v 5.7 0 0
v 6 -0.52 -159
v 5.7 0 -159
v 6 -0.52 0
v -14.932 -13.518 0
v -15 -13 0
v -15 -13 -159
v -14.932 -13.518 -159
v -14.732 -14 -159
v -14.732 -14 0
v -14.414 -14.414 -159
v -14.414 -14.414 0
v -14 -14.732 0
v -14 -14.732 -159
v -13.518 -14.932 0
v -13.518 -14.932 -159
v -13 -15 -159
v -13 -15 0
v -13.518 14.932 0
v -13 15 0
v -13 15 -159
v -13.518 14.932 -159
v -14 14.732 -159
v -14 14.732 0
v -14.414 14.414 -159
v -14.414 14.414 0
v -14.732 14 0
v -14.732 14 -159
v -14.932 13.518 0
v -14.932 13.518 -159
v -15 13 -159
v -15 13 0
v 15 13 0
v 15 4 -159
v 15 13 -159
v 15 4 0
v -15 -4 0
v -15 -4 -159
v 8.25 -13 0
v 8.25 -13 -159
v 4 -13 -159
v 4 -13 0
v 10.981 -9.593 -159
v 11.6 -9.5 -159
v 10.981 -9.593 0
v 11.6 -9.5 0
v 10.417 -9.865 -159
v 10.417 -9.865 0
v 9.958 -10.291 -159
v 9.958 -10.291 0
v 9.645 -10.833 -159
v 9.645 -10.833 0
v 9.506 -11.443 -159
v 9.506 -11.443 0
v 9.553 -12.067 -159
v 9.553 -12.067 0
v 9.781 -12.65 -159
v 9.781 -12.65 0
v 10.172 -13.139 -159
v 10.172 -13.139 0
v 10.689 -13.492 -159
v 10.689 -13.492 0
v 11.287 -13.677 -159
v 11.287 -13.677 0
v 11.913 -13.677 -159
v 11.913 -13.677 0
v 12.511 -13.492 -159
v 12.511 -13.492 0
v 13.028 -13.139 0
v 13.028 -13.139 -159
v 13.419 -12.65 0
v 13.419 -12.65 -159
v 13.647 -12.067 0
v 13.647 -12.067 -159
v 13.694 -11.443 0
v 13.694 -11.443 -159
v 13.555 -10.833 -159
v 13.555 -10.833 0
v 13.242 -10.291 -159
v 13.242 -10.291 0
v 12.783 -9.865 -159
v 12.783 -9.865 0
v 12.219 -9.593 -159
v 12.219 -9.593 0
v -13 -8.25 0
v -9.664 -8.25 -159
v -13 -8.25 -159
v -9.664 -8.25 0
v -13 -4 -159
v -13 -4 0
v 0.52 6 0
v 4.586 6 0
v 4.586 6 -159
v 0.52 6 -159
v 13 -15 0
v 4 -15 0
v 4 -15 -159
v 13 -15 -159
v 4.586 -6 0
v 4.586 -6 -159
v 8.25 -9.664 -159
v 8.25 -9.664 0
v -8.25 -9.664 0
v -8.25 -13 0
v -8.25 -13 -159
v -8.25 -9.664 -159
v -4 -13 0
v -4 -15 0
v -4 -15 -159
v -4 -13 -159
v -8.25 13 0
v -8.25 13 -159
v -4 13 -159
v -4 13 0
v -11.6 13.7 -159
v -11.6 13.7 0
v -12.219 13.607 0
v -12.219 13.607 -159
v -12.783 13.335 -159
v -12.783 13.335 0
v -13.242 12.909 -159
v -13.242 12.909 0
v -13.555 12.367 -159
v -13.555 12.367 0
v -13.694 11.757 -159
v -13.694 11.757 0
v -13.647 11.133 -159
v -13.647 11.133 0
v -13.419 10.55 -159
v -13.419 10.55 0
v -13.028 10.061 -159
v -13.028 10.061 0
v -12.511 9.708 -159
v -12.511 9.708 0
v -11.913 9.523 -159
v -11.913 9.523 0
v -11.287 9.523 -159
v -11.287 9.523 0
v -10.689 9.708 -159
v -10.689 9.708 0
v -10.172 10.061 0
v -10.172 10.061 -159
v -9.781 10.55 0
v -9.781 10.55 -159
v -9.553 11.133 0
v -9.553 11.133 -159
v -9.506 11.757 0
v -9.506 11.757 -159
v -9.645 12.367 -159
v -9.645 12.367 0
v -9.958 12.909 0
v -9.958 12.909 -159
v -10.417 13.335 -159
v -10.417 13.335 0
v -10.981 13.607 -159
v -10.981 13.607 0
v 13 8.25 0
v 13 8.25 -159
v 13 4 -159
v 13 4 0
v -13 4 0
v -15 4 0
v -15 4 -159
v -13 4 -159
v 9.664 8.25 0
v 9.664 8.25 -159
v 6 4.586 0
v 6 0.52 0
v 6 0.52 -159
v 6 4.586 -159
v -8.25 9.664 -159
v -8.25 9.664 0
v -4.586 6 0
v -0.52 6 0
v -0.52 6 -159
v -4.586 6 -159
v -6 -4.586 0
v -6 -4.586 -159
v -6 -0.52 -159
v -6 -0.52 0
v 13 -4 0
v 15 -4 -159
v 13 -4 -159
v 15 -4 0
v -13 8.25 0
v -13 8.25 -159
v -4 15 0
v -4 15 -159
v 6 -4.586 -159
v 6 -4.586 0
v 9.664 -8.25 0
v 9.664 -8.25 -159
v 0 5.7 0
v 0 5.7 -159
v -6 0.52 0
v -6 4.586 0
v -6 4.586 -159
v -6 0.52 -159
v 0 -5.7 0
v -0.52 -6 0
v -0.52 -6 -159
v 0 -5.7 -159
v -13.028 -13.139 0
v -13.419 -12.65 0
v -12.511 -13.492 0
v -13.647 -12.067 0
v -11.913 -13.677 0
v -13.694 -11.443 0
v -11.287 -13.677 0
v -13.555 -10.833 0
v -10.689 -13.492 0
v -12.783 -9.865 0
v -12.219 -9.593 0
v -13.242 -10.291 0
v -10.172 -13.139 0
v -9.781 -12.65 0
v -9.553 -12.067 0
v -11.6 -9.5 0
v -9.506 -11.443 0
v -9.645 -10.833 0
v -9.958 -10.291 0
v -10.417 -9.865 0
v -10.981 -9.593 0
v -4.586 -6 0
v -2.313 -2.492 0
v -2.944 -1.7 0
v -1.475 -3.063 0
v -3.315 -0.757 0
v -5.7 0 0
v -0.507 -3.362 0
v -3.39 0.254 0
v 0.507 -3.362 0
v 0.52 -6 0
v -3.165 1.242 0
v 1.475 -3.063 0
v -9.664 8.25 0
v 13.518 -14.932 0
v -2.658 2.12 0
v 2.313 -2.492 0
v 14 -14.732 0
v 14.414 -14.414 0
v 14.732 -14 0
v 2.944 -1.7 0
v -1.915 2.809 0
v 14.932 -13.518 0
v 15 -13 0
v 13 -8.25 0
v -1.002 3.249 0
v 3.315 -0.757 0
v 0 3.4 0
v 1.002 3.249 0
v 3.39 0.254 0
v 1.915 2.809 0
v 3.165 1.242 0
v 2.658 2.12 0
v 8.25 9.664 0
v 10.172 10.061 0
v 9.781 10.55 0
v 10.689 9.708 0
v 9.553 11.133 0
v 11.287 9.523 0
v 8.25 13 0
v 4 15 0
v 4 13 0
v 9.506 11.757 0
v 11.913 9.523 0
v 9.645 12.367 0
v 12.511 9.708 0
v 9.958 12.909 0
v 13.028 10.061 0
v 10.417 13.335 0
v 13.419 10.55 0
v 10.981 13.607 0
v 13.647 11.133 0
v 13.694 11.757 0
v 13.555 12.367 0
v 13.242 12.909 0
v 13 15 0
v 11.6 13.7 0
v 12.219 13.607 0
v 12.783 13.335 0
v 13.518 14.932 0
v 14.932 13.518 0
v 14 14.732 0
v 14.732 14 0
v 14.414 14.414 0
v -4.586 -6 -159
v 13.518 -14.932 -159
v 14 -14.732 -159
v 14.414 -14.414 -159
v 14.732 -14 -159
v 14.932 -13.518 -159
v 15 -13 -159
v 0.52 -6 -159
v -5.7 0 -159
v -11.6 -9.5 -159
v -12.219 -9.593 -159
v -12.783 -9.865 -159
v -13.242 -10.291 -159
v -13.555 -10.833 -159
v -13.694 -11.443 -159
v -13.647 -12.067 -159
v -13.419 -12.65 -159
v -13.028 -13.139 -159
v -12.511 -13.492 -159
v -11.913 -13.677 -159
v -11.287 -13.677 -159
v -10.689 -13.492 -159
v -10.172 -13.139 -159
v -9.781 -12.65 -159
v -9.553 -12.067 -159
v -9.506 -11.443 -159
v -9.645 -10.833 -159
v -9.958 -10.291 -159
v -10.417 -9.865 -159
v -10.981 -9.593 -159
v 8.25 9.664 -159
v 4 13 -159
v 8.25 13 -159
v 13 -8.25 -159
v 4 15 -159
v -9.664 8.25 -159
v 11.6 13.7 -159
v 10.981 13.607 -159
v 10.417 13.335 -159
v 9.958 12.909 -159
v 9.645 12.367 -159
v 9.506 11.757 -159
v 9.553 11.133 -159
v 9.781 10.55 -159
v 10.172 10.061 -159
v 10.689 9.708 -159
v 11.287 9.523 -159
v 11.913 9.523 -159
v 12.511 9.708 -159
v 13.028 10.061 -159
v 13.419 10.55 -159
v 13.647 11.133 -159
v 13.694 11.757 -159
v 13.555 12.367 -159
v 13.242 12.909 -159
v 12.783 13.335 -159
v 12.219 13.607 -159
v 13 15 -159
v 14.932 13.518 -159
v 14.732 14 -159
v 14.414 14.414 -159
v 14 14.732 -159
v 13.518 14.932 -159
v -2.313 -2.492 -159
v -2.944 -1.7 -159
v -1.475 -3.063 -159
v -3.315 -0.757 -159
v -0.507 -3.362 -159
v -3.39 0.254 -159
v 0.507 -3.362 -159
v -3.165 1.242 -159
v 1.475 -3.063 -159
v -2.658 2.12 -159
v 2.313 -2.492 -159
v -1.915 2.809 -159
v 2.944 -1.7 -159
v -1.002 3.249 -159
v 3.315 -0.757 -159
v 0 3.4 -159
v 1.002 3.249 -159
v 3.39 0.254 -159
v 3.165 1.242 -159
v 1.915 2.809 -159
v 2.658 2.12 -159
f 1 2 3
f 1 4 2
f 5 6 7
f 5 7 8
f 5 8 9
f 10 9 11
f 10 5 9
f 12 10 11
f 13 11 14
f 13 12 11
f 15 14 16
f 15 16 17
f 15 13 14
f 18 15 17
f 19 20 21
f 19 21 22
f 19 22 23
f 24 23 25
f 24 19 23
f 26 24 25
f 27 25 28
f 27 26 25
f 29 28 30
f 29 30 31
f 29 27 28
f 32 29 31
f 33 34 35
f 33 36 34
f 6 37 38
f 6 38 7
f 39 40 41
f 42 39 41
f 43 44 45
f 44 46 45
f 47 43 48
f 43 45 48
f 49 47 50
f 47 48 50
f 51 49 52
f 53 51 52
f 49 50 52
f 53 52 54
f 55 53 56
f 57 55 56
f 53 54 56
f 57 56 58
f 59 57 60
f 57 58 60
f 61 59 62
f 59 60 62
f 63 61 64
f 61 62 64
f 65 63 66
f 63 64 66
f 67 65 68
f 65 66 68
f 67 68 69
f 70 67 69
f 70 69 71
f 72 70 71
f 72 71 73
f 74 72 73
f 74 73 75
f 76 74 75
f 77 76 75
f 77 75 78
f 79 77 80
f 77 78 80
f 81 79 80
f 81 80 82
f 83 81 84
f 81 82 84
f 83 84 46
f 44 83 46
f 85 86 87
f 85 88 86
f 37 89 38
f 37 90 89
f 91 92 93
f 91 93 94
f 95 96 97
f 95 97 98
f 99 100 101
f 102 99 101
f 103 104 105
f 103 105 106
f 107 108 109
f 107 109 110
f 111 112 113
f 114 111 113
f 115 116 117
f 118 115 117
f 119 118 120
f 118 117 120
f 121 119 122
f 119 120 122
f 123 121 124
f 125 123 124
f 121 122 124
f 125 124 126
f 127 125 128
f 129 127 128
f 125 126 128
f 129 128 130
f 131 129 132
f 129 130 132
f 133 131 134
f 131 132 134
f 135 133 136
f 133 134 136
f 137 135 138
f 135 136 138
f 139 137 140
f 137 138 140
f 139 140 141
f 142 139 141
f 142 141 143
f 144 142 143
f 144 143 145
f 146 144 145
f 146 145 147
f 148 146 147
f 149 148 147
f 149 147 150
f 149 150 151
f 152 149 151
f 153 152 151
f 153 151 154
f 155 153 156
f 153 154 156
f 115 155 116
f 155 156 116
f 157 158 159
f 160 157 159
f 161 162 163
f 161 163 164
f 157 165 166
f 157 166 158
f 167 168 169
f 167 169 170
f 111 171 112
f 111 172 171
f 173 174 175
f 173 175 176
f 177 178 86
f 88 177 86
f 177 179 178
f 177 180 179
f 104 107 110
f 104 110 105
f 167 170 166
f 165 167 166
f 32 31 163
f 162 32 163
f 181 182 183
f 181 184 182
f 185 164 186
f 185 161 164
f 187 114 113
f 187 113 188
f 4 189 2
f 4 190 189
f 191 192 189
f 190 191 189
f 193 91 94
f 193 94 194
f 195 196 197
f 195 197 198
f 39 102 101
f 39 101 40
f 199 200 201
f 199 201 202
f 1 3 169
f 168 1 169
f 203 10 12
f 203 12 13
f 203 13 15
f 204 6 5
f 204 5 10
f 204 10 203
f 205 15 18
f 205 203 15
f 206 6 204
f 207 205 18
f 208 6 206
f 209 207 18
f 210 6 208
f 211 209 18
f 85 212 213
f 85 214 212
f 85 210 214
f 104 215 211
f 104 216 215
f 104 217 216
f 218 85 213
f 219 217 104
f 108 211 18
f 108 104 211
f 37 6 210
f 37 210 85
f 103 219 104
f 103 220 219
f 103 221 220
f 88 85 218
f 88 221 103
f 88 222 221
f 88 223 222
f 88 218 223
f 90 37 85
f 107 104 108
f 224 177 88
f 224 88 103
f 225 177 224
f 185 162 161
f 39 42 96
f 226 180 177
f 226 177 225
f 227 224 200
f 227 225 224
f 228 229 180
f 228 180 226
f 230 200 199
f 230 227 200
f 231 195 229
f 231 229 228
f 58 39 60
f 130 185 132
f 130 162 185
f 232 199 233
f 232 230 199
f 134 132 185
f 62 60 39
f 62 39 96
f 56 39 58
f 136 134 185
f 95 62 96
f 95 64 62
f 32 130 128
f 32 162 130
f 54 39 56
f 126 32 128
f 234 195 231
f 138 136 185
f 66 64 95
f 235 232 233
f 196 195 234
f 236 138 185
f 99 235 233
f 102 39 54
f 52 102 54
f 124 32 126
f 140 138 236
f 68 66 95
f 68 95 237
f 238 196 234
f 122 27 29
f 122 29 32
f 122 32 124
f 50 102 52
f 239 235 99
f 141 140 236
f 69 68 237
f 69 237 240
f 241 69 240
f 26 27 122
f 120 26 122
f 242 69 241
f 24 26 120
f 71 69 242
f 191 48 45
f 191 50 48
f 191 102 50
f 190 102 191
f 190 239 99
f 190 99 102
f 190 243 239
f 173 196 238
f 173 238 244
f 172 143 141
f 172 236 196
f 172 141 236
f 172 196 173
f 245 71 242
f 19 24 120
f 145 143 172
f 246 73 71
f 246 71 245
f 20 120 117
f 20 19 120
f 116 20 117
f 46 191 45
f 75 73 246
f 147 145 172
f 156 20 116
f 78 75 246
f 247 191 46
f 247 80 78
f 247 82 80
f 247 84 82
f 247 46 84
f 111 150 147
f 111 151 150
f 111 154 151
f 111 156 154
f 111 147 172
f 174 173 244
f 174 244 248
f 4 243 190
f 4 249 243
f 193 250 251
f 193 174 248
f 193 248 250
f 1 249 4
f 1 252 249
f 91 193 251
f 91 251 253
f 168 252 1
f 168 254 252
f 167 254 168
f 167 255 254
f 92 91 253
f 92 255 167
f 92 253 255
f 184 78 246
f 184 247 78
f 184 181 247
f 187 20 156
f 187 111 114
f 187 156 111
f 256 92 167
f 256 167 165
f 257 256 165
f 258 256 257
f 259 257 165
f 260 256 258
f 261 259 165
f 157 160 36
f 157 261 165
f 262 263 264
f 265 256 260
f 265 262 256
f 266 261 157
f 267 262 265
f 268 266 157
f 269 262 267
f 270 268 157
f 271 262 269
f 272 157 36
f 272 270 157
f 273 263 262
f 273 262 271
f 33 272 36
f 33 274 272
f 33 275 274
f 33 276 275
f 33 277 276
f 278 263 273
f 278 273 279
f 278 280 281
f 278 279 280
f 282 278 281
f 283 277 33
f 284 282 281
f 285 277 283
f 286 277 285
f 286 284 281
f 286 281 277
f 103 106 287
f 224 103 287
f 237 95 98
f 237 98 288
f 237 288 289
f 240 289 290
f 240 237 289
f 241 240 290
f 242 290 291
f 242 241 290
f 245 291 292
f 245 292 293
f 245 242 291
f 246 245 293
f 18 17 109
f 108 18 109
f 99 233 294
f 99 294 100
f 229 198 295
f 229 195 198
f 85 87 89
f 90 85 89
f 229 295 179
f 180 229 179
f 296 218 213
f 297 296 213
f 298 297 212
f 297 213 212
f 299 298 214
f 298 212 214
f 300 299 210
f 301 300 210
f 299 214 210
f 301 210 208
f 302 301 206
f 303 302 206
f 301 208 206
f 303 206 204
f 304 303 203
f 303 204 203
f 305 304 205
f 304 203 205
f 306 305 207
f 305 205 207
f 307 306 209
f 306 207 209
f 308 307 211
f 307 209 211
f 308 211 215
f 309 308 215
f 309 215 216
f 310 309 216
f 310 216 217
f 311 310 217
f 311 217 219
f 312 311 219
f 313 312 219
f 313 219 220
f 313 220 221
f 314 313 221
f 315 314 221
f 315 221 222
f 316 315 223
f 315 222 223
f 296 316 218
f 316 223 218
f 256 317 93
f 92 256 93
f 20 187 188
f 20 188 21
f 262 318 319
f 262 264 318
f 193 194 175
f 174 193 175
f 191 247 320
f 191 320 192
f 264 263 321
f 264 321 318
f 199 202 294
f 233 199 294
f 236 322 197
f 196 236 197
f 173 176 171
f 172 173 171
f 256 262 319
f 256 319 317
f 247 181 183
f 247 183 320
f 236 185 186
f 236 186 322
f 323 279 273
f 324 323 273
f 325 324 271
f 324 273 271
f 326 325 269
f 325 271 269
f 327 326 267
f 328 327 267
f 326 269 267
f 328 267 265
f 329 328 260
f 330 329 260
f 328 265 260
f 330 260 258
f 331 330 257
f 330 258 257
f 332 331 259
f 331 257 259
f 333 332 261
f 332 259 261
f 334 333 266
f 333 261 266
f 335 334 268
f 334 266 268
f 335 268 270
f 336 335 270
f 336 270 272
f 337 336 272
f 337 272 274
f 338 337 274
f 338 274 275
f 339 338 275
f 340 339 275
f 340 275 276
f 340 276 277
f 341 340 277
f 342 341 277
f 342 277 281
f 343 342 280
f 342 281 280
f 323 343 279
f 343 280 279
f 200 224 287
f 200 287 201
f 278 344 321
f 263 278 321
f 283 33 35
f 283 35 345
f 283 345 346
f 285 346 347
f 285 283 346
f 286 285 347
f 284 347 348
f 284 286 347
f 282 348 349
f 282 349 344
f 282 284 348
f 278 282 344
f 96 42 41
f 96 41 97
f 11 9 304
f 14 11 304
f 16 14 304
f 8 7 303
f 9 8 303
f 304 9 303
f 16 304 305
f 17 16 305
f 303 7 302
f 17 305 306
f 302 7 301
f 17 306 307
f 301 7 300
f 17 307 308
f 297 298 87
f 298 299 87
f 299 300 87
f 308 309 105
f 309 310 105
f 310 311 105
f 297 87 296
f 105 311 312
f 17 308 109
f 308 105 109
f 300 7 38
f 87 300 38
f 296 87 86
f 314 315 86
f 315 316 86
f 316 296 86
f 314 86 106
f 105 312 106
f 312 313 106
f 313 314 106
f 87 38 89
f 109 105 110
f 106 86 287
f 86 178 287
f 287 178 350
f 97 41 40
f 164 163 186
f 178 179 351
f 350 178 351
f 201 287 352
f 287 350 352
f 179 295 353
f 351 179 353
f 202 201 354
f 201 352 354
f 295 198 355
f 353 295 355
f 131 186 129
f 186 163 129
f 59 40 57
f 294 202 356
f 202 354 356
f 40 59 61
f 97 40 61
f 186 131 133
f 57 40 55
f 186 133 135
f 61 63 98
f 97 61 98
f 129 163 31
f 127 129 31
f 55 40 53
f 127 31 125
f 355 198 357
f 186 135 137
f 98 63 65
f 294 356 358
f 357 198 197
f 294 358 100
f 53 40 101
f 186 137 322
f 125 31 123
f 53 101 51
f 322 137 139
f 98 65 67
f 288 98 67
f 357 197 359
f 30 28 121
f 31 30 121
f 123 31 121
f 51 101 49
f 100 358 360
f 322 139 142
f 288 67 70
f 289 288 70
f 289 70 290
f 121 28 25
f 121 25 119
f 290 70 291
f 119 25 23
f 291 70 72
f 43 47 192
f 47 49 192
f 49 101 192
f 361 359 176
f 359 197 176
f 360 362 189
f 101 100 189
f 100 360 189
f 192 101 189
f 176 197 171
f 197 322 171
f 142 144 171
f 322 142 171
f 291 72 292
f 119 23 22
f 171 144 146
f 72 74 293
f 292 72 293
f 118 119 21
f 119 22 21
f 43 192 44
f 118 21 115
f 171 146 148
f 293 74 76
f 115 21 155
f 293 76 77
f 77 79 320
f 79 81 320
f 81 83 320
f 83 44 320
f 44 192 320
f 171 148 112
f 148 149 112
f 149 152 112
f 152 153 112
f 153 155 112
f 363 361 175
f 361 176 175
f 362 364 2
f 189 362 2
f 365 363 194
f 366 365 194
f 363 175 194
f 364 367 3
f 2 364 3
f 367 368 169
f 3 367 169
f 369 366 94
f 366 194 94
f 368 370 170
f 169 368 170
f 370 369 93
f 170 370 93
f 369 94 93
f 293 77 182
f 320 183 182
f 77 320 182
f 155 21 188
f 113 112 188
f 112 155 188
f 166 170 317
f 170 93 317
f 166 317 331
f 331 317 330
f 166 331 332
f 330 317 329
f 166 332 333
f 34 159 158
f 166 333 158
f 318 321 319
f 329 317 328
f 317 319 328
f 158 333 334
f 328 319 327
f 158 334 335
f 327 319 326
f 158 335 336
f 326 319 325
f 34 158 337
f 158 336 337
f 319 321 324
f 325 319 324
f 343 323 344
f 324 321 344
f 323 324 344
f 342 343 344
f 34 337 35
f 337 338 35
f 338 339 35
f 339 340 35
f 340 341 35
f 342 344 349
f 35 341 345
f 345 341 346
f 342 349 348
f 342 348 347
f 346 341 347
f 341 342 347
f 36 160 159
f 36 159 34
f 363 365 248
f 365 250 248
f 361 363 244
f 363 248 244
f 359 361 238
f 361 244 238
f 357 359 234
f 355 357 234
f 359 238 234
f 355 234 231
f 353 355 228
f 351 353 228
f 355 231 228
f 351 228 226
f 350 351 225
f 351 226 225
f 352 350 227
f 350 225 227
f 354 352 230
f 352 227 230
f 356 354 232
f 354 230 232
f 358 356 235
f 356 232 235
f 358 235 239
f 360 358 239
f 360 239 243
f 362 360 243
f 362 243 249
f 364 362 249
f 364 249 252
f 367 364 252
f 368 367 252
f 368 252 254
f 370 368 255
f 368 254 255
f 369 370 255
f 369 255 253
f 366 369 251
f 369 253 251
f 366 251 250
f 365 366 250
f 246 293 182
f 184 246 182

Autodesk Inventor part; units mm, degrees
sketch "Sketch_1" plane through (0, 0, 0) normal (0, 0, 1) x (1, 0, 0)
  line L0 (-15, 4) -> (-13, 4)
  line L1 (-13, 4) -> (-13, 8.25)
  line L2 (-13, 8.25) -> (-9.6642, 8.25)
  line L3 (-9.6642, 8.25) -> (-6, 4.5858)
  line L4 (-6, 4.5858) -> (-6, 0.5196)
  line L5 (-6, 0.5196) -> (-5.7, 0)
  line L6 (-5.7, 0) -> (-6, -0.5196)
  line L7 (-6, -0.5196) -> (-6, -4.5858)
  line L8 (-6, -4.5858) -> (-9.6642, -8.25)
  line L9 (-9.6642, -8.25) -> (-13, -8.25)
  line L10 (-13, -8.25) -> (-13, -4)
  line L11 (-13, -4) -> (-15, -4)
  line L12 (-15, -4) -> (-15, -13)
  arc A0 (-15, -13) -> (-13, -15) centre (-13, -13) ccw
  line L13 (-13, -15) -> (-4, -15)
  line L14 (-4, -15) -> (-4, -13)
  line L15 (-4, -13) -> (-8.25, -13)
  line L16 (-8.25, -13) -> (-8.25, -9.6642)
  line L17 (-8.25, -9.6642) -> (-4.5858, -6)
  line L18 (-4.5858, -6) -> (-0.5196, -6)
  line L19 (-0.5196, -6) -> (0, -5.7)
  line L20 (0, -5.7) -> (0.5196, -6)
  line L21 (0.5196, -6) -> (4.5858, -6)
  line L22 (4.5858, -6) -> (8.25, -9.6642)
  line L23 (8.25, -9.6642) -> (8.25, -13)
  line L24 (8.25, -13) -> (4, -13)
  line L25 (4, -13) -> (4, -15)
  line L26 (4, -15) -> (13, -15)
  arc A1 (13, -15) -> (15, -13) centre (13, -13) ccw
  line L27 (15, -13) -> (15, -4)
  line L28 (15, -4) -> (13, -4)
  line L29 (13, -4) -> (13, -8.25)
  line L30 (13, -8.25) -> (9.6642, -8.25)
  line L31 (9.6642, -8.25) -> (6, -4.5858)
  line L32 (6, -4.5858) -> (6, -0.5196)
  line L33 (6, -0.5196) -> (5.7, 0)
  line L34 (5.7, 0) -> (6, 0.5196)
  line L35 (6, 0.5196) -> (6, 4.5858)
  line L36 (6, 4.5858) -> (9.6642, 8.25)
  line L37 (9.6642, 8.25) -> (13, 8.25)
  line L38 (13, 8.25) -> (13, 4)
  line L39 (13, 4) -> (15, 4)
  line L40 (15, 4) -> (15, 13)
  arc A2 (15, 13) -> (13, 15) centre (13, 13) ccw
  line L41 (13, 15) -> (4, 15)
  line L42 (4, 15) -> (4, 13)
  line L43 (4, 13) -> (8.25, 13)
  line L44 (8.25, 13) -> (8.25, 9.6642)
  line L45 (8.25, 9.6642) -> (4.5858, 6)
  line L46 (4.5858, 6) -> (0.5196, 6)
  line L47 (0.5196, 6) -> (0, 5.7)
  line L48 (0, 5.7) -> (-0.5196, 6)
  line L49 (-0.5196, 6) -> (-4.5858, 6)
  line L50 (-4.5858, 6) -> (-8.25, 9.6642)
  line L51 (-8.25, 9.6642) -> (-8.25, 13)
  line L52 (-8.25, 13) -> (-4, 13)
  line L53 (-4, 13) -> (-4, 15)
  line L54 (-4, 15) -> (-13, 15)
  arc A3 (-13, 15) -> (-15, 13) centre (-13, 13) ccw
  line L55 (-15, 13) -> (-15, 4)
extrude "Extrusion1" add sketch "Sketch_1" against normal blind 159
sketch "Sketch2" plane through (0, 0, -159) normal (0, 0, -1) x (-1, 0, 0)
  point P0 (0, 0)
hole "Hole1" at (0, 0, -159) direction (0, 0, 1) diameter 6.8 depth 159
sketch "Sketch3" plane through (0, 0, -159) normal (0, 0, -1) x (-1, 0, 0)
  point P0 (-11.6, 11.6)
hole "Hole2" at (11.6, 11.6, -159) direction (0, 0, 1) diameter 4.2 depth 159
pattern_linear "Rectangular Pattern1" count 2 spacing 23.2 along (-1, 0, 0) count 2 spacing 23.2 along (0, -1, 0) of "Hole2"
ref_plane "C1_XY" through (0, 0, 0) normal (0, 0, 1) x (1, 0, 0)
ref_plane "C1_YZ" through (0, 0, 0) normal (1, 0, 0) x (0, 1, 0)
ref_plane "C1_ZX" through (0, 0, 0) normal (0, 1, 0) x (0, 0, 1)
ref_plane "to_frame_cap1_XY" through (0, 0, 0) normal (0, 0, 1) x (1, 0, 0)
ref_plane "to_frame_cap1_YZ" through (0, 0, 0) normal (1, 0, 0) x (0, 1, 0)
ref_plane "to_frame_cap1_ZX" through (0, 0, 0) normal (0, 1, 0) x (0, 0, 1)
ref_plane "to_frame_cap2_XY" through (0, 0, -159) normal (0, 0, -1) x (1, 0, 0)
ref_plane "to_frame_cap2_YZ" through (0, 0, -159) normal (1, 0, 0) x (0, -1, 0)
ref_plane "to_frame_cap2_ZX" through (0, 0, -159) normal (0, -1, 0) x (0, 0, -1)
properties part number "HFS6-3030-159"
